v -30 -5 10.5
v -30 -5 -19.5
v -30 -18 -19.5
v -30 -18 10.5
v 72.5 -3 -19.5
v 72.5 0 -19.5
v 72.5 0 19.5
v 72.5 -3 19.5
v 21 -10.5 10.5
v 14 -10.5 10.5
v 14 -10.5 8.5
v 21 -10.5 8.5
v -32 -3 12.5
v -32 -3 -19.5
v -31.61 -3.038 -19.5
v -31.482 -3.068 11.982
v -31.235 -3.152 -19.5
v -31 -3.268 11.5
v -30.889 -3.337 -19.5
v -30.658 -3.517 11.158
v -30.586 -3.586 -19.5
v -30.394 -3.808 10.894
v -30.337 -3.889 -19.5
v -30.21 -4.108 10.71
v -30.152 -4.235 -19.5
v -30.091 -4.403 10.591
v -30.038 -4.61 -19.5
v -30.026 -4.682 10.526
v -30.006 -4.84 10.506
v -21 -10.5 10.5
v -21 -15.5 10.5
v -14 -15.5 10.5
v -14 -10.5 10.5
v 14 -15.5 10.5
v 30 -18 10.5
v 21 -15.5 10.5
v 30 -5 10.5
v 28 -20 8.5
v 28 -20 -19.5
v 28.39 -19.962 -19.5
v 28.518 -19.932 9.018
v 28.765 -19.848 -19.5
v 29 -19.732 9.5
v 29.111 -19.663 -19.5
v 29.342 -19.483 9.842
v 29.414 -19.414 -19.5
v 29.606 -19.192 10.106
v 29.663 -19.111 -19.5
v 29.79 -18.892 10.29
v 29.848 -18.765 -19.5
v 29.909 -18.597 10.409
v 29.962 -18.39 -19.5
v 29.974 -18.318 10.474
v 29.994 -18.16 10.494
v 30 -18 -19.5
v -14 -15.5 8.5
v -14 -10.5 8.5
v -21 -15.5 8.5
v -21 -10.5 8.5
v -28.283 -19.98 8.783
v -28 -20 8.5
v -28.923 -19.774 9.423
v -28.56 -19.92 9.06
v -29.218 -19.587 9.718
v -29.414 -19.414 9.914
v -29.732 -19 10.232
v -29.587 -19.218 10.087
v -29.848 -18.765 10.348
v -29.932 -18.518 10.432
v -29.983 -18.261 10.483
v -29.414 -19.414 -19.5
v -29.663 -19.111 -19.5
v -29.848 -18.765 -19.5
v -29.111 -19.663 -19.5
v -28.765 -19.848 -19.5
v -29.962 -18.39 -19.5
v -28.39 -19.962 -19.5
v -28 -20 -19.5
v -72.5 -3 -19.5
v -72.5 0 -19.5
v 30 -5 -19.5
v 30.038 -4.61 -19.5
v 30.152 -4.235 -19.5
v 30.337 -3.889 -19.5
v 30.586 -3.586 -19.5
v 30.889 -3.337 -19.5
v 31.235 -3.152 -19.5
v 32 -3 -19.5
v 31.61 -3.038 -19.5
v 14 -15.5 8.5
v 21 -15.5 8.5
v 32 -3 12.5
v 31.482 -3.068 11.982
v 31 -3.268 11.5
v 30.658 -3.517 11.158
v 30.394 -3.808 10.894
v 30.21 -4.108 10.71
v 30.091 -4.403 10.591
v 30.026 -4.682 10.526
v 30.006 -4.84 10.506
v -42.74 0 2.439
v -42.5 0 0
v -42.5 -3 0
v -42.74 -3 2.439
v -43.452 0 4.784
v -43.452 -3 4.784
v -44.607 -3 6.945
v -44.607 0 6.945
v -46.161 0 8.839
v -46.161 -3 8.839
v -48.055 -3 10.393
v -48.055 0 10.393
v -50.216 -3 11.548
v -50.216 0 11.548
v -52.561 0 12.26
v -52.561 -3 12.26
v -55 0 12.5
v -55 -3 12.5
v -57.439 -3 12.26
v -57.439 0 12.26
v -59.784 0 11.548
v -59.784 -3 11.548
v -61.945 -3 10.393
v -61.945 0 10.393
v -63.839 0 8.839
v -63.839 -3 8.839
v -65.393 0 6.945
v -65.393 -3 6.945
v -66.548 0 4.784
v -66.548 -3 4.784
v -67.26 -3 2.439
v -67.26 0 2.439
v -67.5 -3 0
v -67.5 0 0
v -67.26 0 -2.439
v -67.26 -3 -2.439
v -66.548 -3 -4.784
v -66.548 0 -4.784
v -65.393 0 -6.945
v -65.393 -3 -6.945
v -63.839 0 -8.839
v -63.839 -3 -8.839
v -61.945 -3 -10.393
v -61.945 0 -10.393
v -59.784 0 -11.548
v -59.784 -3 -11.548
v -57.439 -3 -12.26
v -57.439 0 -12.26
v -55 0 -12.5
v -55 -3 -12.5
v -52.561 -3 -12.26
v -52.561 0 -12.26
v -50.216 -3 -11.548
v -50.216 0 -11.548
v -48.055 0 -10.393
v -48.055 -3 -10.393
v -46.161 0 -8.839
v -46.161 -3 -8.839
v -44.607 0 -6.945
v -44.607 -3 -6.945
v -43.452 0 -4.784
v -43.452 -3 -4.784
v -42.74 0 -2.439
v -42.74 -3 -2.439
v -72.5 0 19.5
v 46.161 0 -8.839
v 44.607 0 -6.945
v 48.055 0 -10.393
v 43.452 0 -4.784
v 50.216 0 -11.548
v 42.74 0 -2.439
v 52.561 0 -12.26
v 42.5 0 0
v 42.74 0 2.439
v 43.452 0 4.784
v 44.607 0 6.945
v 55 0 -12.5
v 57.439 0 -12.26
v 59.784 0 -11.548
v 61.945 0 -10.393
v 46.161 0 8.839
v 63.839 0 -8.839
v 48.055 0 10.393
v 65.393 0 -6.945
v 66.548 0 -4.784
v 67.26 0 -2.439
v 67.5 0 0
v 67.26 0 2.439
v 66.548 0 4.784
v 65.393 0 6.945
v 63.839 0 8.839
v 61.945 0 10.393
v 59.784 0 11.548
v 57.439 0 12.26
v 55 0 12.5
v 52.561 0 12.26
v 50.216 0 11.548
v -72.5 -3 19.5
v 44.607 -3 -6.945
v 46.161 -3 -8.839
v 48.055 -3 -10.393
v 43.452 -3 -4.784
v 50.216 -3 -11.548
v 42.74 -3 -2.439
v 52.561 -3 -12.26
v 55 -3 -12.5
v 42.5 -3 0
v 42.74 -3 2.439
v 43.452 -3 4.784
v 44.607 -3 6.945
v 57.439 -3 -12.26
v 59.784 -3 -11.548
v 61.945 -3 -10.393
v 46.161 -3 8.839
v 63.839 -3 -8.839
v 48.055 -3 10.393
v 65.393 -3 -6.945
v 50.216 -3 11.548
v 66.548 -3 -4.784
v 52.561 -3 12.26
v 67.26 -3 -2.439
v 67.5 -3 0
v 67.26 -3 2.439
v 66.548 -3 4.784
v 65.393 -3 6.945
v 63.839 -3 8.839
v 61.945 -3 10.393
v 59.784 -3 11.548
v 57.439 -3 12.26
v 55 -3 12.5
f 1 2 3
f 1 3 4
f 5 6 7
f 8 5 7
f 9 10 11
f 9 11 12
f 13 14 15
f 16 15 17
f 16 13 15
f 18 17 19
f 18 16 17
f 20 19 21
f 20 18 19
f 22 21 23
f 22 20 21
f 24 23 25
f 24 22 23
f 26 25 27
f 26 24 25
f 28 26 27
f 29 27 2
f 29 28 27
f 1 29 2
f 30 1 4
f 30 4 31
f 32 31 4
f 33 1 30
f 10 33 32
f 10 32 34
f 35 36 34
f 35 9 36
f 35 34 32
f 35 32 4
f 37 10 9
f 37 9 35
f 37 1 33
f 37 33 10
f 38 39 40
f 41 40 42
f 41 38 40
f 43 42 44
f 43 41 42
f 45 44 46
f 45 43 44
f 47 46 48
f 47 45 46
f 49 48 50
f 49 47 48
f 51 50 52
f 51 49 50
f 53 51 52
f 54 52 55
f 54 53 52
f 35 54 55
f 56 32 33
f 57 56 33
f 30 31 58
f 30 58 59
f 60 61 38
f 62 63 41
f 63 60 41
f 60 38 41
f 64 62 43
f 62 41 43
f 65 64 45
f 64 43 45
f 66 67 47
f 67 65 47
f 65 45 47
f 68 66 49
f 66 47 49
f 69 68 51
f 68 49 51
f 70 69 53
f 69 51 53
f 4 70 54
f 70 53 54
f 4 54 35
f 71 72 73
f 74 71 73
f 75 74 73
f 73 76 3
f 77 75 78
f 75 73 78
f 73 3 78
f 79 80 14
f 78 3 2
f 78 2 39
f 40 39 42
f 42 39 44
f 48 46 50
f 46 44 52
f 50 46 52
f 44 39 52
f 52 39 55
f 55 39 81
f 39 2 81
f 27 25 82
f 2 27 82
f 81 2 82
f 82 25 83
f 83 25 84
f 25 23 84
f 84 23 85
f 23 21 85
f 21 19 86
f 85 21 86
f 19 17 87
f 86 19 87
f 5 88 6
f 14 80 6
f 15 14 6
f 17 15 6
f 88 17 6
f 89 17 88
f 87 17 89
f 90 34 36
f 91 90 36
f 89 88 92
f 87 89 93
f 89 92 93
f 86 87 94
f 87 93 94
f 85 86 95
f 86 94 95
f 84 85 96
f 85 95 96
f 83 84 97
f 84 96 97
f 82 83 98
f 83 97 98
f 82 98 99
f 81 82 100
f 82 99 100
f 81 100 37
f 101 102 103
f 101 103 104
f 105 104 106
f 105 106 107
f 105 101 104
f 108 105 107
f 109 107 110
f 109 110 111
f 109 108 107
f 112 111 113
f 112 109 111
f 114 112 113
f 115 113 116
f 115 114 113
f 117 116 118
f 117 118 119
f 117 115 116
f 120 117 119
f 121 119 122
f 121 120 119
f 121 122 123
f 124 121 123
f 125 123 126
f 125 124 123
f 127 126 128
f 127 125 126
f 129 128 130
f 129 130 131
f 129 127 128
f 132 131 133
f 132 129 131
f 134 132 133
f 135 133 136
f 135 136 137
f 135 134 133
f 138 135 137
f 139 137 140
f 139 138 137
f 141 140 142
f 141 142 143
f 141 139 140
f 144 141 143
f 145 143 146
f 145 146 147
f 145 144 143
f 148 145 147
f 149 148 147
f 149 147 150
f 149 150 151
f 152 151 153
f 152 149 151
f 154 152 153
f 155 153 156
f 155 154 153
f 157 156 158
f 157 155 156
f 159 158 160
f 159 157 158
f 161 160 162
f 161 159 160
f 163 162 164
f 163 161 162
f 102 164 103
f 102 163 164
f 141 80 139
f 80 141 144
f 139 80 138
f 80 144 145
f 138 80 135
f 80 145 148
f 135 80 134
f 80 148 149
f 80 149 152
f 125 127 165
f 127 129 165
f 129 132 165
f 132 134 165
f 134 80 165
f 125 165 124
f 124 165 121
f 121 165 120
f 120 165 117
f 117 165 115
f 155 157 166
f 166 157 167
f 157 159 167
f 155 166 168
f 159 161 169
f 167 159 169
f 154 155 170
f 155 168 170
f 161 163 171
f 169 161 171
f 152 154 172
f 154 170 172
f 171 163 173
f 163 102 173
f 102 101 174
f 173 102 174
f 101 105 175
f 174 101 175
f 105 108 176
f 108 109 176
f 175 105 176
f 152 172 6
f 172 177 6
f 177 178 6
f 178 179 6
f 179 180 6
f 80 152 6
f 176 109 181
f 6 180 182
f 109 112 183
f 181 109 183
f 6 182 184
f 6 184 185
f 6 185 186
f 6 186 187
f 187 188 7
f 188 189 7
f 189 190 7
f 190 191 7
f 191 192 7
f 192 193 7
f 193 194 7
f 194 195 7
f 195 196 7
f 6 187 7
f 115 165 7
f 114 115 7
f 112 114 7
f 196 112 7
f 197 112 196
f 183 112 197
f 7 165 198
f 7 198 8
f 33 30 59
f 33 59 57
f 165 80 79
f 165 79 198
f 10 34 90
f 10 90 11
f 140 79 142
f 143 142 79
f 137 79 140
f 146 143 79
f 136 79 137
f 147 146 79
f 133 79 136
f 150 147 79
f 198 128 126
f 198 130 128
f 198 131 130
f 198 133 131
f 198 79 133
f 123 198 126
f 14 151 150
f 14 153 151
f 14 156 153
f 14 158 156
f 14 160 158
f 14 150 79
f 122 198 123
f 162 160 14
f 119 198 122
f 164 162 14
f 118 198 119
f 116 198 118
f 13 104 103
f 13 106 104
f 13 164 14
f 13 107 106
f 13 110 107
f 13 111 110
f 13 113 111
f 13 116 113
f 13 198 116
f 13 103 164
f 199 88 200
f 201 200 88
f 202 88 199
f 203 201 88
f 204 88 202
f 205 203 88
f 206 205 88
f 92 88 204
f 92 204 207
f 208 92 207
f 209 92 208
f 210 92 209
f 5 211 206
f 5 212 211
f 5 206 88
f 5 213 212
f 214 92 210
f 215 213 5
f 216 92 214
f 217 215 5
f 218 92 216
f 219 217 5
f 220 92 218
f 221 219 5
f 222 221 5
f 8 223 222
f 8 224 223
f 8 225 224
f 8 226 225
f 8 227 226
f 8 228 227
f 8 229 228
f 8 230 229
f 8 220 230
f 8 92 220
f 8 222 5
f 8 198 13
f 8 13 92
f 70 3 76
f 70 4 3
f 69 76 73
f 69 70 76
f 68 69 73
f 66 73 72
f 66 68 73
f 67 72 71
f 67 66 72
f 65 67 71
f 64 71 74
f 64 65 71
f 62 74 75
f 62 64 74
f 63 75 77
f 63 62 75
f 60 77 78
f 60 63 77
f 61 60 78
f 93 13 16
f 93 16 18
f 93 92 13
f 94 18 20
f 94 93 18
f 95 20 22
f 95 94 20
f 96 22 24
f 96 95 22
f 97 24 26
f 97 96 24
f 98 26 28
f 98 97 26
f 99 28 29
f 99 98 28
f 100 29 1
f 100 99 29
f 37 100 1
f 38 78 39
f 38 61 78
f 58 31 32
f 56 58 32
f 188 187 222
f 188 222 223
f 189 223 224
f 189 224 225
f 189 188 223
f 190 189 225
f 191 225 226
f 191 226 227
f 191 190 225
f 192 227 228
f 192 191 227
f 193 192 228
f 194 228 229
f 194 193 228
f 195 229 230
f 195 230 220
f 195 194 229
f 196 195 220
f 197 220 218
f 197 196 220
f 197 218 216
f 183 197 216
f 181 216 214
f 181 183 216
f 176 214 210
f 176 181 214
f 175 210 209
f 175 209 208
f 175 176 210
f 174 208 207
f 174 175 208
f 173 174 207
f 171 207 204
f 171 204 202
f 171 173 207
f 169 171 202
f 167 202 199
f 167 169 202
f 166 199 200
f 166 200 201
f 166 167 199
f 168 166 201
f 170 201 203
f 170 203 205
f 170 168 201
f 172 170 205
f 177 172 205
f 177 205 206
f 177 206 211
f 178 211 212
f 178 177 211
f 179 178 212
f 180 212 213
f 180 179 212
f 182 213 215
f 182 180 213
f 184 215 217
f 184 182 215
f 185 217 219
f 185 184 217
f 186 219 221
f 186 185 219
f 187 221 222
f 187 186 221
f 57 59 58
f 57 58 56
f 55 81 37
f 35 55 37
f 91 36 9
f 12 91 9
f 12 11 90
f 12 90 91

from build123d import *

# Parameters (mm, degrees)
F0_W     = 145
F0_H     = 39
F0_R     = 12.5
F1_DEPTH = 3
F2_W     = 60
F2_H     = 30
F3_DEPTH = 17
F4_W     = 7
F4_H     = 5
F5_DEPTH = 2
F6_R     = 2


with BuildPart() as f1:
    # F0 (on Front) → F1 (new body)
    with BuildSketch(Plane.XZ):
        Rectangle(F0_W, F0_H)
        with Locations((-55, 0)):
            Circle(F0_R, mode=Mode.SUBTRACT)
        with Locations((55, 0)):
            Circle(F0_R, mode=Mode.SUBTRACT)
    extrude(amount=F1_DEPTH)

    # F2 (on face) → F3 (join)
    with BuildSketch(Plane.XZ.offset(3)):
        with Locations((0, -4.5)):
            Rectangle(F2_W, F2_H)
    extrude(amount=F3_DEPTH)

    # F4 (on face) → F5 (cut)
    with BuildSketch(Plane.XY.offset(10.5)):
        with Locations((-17.5, -13)):
            Rectangle(F4_W, F4_H)
        with Locations((17.5, -13)):
            Rectangle(F4_W, F4_H)
    extrude(amount=-F5_DEPTH, mode=Mode.SUBTRACT)

    # F6
    f6_edges = [f1.edges().sort_by_distance(p)[0] for p in [
        (0, -3, 10.5),
        (30, -3, -4.5),
        (-30, -3, -4.5),
        (-30, -20, -4.5),
        (0, -20, 10.5),
        (30, -20, -4.5),
    ]]
    fillet(f6_edges, radius=F6_R)


solid = f1.part
